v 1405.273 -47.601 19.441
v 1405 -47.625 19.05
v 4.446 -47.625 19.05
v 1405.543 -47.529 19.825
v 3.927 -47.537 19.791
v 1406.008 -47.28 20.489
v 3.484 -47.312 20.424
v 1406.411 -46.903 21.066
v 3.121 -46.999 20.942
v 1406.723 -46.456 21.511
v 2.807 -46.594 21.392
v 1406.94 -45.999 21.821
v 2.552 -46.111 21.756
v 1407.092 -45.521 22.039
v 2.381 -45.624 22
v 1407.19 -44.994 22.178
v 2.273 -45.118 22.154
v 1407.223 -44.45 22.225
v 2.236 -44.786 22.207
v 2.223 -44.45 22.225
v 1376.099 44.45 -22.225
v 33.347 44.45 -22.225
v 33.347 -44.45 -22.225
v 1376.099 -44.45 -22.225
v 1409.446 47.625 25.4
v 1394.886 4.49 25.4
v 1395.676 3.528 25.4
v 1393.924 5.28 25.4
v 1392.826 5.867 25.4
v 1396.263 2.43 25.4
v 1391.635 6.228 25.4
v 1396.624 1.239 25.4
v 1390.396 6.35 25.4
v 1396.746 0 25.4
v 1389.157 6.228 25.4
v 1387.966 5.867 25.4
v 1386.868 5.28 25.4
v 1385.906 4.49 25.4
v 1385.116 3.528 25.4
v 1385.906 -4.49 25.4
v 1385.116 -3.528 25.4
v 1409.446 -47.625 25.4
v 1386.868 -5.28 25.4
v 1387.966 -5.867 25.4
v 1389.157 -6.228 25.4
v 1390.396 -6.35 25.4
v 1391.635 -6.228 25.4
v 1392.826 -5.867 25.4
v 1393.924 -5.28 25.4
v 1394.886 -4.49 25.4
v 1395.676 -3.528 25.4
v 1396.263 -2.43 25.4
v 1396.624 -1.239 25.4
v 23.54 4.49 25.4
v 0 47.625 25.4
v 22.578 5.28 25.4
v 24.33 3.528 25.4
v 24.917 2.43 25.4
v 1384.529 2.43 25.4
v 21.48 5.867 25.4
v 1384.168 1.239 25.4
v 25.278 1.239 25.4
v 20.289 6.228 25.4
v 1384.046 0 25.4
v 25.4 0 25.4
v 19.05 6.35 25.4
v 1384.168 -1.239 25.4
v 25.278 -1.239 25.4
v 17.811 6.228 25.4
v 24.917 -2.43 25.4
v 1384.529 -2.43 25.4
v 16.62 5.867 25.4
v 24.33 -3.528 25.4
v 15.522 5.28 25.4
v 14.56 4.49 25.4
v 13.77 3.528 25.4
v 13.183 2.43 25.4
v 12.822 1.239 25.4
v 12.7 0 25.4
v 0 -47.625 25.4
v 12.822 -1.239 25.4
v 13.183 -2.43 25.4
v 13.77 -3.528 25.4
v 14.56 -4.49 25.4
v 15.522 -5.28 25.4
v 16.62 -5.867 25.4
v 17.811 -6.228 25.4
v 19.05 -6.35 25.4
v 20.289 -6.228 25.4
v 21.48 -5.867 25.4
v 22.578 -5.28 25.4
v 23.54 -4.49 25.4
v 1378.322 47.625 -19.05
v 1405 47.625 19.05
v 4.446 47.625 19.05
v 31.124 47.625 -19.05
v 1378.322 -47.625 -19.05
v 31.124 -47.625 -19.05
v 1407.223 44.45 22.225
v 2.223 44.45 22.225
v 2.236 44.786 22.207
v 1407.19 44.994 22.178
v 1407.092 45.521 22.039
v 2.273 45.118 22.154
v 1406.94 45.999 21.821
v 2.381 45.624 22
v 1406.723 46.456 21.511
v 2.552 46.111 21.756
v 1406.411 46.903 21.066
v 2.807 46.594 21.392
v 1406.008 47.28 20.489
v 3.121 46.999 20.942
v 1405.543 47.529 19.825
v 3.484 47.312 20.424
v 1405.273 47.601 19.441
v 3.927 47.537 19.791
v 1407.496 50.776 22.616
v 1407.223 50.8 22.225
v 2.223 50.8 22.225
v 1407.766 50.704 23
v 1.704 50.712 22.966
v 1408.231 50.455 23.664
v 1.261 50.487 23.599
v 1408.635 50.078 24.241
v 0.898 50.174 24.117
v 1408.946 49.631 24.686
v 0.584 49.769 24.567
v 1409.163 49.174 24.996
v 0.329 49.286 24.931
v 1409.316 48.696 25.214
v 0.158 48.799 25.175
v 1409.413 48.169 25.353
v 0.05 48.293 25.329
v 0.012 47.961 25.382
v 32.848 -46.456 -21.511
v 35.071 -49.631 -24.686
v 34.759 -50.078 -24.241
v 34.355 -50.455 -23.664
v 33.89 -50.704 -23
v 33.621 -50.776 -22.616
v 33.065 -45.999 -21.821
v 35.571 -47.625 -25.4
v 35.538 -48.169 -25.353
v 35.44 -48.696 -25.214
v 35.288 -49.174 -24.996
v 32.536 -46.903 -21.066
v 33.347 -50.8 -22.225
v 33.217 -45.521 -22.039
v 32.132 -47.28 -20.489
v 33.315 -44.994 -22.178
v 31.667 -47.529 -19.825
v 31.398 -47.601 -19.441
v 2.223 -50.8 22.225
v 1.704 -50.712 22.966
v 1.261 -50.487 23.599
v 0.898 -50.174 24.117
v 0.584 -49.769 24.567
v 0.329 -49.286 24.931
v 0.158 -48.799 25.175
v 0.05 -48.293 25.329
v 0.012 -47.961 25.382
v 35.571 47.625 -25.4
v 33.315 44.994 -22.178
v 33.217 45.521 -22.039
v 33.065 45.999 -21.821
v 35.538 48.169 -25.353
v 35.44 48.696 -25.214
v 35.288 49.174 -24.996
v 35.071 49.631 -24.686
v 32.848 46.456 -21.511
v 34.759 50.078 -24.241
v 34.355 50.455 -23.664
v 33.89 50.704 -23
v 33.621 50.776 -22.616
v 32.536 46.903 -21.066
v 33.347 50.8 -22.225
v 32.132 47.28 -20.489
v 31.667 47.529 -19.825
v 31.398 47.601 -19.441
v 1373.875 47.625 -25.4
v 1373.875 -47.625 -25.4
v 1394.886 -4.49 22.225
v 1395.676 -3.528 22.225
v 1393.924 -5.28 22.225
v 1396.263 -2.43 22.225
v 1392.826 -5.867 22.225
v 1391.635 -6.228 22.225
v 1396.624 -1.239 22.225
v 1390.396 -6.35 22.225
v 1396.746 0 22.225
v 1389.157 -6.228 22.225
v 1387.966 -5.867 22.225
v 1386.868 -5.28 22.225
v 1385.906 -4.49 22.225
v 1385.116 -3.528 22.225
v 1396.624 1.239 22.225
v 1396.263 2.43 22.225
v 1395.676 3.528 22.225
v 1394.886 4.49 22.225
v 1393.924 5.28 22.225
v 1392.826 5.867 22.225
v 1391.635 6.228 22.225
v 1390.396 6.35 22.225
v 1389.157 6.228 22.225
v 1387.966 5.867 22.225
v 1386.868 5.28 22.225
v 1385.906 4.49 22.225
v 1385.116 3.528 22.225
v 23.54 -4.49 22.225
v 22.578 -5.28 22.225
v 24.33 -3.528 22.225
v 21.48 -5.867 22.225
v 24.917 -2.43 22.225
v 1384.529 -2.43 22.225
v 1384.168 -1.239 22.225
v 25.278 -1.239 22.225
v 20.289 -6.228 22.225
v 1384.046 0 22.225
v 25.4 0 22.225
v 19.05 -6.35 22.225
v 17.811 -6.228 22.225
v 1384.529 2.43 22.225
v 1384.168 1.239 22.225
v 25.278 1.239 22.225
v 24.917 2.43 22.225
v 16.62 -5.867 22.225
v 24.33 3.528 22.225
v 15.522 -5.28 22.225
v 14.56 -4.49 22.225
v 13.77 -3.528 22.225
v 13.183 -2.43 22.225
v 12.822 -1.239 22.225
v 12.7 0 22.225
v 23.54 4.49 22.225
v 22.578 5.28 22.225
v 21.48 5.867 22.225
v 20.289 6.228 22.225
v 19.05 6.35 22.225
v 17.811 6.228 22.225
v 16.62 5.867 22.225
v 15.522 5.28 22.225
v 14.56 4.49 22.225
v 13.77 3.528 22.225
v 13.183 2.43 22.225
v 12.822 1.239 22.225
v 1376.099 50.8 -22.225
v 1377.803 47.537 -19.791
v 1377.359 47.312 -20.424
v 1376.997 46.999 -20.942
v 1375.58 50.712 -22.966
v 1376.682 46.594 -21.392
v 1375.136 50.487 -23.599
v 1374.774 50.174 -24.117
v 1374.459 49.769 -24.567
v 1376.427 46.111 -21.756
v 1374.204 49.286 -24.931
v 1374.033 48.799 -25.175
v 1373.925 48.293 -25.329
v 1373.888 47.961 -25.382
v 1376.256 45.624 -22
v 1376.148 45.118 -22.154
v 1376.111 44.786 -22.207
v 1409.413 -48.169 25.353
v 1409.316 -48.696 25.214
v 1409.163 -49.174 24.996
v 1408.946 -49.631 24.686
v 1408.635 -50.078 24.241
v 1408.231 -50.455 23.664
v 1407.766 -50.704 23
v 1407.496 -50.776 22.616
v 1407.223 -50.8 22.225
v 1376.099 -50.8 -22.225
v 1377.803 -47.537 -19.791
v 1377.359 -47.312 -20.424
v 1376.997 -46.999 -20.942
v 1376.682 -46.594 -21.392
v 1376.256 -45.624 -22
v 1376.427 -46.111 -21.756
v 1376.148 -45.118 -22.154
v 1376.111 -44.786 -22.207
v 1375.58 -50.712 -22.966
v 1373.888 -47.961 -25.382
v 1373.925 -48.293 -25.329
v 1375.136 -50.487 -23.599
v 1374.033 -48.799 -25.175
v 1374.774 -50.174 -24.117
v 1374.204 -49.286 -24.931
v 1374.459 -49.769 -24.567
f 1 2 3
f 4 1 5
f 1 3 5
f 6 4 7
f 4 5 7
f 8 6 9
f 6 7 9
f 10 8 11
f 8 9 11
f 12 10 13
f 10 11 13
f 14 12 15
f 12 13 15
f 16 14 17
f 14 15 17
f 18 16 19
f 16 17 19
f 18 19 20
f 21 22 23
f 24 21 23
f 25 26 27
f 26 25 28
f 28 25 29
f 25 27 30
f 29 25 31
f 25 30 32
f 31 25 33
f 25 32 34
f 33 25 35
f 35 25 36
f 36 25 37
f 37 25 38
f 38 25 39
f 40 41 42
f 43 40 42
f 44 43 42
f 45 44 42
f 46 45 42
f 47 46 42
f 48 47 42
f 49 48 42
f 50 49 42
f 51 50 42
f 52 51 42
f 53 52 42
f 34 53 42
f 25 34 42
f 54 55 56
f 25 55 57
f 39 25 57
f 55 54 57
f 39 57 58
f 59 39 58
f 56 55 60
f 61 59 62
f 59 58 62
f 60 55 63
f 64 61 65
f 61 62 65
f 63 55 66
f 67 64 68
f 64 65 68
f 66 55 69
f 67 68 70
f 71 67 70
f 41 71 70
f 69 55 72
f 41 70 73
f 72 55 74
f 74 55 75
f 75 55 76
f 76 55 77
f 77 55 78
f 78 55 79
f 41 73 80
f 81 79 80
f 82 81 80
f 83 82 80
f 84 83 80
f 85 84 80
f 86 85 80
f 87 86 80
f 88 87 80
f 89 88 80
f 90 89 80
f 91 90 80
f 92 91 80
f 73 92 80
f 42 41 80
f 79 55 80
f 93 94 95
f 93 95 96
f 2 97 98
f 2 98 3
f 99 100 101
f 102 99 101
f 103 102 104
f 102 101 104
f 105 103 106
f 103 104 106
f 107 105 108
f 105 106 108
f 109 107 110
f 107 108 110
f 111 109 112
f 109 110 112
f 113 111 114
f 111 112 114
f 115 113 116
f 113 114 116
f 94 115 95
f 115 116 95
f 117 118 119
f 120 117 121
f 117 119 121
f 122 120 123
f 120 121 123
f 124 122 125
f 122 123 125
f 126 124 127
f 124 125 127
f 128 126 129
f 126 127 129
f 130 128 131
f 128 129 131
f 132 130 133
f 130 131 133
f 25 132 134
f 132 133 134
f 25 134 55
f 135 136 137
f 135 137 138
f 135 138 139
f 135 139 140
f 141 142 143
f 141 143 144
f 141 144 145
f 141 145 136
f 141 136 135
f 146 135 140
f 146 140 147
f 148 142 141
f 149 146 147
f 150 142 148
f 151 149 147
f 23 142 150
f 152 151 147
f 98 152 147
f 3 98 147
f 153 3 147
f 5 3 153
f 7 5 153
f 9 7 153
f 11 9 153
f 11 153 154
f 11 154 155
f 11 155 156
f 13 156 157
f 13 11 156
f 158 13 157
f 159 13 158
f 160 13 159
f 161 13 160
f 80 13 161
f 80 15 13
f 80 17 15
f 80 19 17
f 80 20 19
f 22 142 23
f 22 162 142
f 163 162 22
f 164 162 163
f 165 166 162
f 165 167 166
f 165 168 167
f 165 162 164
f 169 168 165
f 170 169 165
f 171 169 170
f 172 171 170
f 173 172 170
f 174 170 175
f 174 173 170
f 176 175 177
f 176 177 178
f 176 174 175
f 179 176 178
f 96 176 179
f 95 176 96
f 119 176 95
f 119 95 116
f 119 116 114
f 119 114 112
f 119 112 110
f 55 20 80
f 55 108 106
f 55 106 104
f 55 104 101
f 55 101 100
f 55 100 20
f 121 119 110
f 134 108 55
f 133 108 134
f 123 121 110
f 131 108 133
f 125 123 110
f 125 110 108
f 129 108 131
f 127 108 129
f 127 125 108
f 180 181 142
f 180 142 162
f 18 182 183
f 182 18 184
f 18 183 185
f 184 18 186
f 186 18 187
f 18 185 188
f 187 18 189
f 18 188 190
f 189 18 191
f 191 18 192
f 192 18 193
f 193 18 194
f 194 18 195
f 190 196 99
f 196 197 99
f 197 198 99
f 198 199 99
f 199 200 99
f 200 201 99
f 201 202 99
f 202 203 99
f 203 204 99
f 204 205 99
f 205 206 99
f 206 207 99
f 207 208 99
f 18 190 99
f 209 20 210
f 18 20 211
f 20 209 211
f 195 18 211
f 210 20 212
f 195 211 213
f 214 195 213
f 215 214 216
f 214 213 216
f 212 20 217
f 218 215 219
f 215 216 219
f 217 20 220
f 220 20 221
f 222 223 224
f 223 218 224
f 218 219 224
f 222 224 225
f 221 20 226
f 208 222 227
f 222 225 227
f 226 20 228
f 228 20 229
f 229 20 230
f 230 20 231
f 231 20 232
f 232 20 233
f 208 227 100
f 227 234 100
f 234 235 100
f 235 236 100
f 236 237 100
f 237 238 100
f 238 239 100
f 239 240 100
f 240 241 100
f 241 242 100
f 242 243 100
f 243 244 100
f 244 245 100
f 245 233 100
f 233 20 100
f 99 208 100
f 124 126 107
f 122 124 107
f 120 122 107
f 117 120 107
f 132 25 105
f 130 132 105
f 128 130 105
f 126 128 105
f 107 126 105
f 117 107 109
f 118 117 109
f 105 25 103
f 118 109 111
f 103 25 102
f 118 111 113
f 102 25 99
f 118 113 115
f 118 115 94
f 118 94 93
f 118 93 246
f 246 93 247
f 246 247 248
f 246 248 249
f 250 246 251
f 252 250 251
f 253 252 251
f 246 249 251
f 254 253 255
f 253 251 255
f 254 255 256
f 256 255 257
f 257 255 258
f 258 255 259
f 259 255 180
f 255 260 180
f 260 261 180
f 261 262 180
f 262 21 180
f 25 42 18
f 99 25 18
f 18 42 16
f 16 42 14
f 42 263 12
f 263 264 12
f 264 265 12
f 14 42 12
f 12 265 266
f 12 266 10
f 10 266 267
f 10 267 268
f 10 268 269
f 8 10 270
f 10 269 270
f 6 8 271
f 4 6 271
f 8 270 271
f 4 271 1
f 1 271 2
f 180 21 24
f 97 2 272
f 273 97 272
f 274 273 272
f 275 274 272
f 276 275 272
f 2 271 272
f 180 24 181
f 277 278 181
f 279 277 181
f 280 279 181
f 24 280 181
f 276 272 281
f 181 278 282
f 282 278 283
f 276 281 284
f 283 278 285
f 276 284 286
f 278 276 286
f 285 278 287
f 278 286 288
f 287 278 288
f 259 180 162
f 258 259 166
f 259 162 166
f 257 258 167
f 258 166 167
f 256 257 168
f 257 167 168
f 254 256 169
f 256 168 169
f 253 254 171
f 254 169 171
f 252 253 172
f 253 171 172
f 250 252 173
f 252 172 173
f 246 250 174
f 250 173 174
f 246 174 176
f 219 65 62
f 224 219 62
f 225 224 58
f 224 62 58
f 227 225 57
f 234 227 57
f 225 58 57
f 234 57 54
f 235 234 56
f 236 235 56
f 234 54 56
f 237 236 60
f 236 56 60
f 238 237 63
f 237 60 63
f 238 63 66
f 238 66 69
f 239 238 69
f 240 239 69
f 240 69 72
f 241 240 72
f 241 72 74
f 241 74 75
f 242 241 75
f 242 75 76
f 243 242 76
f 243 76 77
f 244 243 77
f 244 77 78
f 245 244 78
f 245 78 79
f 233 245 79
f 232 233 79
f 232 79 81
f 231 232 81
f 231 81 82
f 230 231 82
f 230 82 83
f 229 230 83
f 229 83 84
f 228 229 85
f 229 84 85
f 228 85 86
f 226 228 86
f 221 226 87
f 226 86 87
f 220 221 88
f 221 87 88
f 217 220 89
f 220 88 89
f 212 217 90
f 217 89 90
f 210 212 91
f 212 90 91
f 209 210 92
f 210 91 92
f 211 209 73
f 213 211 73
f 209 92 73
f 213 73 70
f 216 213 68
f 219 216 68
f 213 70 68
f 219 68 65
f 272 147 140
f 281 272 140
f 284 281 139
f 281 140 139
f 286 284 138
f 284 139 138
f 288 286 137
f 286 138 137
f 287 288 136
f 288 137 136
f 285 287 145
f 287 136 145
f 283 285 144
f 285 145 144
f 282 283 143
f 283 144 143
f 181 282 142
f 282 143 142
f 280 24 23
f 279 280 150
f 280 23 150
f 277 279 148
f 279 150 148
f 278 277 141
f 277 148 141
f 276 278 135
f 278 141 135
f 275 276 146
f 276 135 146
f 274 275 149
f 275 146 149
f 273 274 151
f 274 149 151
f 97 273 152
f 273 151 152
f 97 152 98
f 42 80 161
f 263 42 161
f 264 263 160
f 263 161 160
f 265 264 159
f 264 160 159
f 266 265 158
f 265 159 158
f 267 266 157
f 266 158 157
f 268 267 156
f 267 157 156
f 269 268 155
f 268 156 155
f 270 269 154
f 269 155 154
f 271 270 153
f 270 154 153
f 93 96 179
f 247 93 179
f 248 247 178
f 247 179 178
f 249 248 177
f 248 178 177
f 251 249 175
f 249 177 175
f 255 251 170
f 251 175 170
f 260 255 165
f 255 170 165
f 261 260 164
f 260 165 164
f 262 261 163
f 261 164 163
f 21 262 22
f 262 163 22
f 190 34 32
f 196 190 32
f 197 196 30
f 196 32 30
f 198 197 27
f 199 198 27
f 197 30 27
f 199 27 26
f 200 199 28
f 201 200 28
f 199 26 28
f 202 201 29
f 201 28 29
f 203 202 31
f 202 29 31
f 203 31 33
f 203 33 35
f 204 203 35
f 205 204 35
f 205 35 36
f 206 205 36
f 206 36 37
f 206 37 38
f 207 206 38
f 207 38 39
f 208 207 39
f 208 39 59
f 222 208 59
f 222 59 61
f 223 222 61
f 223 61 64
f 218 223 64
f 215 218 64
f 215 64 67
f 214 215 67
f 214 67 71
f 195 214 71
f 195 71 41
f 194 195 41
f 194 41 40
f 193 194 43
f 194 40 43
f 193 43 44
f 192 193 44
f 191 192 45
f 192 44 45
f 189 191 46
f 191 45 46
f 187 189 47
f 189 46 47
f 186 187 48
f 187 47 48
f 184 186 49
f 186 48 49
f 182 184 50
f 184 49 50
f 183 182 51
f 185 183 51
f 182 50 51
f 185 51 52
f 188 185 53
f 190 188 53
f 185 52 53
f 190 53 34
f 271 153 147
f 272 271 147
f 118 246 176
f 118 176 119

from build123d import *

# Parameters (mm, degrees)
F1_DEPTH      = 1409.446
F3_DEPTH      = 50.801
F3_DEPTH_BACK = 50.801
F4_R          = 6.35
F5_DEPTH      = 25.4


with BuildPart() as f1:
    # F0 (on Right) → F1 (new body)
    with BuildSketch(Plane.YZ):
        with BuildLine():
            Line((-47.625, -25.4), (47.625, -25.4))
            ThreePointArc((47.625, -25.4), (49.8700640303, -24.4700640303), (50.8, -22.225))
            Line((50.8, -22.225), (50.8, 22.225))
            ThreePointArc((50.8, 22.225), (49.8700640303, 24.4700640303), (47.625, 25.4))
            Line((47.625, 25.4), (-47.625, 25.4))
            ThreePointArc((-47.625, 25.4), (-49.8700640303, 24.4700640303), (-50.8, 22.225))
            Line((-50.8, 22.225), (-50.8, -22.225))
            ThreePointArc((-50.8, -22.225), (-49.8700640303, -24.4700640303), (-47.625, -25.4))
        make_face()
        with BuildLine():
            Line((-44.45, 22.225), (44.45, 22.225))
            ThreePointArc((44.45, 22.225), (46.6950640303, 21.2950640303), (47.625, 19.05))
            Line((47.625, 19.05), (47.625, -19.05))
            ThreePointArc((47.625, -19.05), (46.6950640303, -21.2950640303), (44.45, -22.225))
            Line((44.45, -22.225), (-44.45, -22.225))
            ThreePointArc((-44.45, -22.225), (-46.6950640303, -21.2950640303), (-47.625, -19.05))
            Line((-47.625, -19.05), (-47.625, 19.05))
            ThreePointArc((-47.625, 19.05), (-46.6950640303, 21.2950640303), (-44.45, 22.225))
        make_face(mode=Mode.SUBTRACT)
    extrude(amount=F1_DEPTH)

    # F2 (on Front) → F3 (cut, two sides)
    with BuildSketch(Plane.XZ) as f3_sk:
        Polygon((0, 25.4), (0, -25.4), (35.5705429411, -25.4), align=None)
        Polygon((1409.446, 25.4), (1373.8754570589, -25.4), (1409.446, -25.4), align=None)
    extrude(amount=-F3_DEPTH, mode=Mode.SUBTRACT)
    extrude(f3_sk.sketch, amount=F3_DEPTH_BACK, mode=Mode.SUBTRACT)

    # F4 (on face) → F5 (cut)
    with BuildSketch(Plane.XY.offset(25.4)):
        with Locations((19.05, 0)):
            Circle(F4_R)
        with Locations((1390.396, 0)):
            Circle(F4_R)
    extrude(amount=-F5_DEPTH, mode=Mode.SUBTRACT)


solid = f1.part
